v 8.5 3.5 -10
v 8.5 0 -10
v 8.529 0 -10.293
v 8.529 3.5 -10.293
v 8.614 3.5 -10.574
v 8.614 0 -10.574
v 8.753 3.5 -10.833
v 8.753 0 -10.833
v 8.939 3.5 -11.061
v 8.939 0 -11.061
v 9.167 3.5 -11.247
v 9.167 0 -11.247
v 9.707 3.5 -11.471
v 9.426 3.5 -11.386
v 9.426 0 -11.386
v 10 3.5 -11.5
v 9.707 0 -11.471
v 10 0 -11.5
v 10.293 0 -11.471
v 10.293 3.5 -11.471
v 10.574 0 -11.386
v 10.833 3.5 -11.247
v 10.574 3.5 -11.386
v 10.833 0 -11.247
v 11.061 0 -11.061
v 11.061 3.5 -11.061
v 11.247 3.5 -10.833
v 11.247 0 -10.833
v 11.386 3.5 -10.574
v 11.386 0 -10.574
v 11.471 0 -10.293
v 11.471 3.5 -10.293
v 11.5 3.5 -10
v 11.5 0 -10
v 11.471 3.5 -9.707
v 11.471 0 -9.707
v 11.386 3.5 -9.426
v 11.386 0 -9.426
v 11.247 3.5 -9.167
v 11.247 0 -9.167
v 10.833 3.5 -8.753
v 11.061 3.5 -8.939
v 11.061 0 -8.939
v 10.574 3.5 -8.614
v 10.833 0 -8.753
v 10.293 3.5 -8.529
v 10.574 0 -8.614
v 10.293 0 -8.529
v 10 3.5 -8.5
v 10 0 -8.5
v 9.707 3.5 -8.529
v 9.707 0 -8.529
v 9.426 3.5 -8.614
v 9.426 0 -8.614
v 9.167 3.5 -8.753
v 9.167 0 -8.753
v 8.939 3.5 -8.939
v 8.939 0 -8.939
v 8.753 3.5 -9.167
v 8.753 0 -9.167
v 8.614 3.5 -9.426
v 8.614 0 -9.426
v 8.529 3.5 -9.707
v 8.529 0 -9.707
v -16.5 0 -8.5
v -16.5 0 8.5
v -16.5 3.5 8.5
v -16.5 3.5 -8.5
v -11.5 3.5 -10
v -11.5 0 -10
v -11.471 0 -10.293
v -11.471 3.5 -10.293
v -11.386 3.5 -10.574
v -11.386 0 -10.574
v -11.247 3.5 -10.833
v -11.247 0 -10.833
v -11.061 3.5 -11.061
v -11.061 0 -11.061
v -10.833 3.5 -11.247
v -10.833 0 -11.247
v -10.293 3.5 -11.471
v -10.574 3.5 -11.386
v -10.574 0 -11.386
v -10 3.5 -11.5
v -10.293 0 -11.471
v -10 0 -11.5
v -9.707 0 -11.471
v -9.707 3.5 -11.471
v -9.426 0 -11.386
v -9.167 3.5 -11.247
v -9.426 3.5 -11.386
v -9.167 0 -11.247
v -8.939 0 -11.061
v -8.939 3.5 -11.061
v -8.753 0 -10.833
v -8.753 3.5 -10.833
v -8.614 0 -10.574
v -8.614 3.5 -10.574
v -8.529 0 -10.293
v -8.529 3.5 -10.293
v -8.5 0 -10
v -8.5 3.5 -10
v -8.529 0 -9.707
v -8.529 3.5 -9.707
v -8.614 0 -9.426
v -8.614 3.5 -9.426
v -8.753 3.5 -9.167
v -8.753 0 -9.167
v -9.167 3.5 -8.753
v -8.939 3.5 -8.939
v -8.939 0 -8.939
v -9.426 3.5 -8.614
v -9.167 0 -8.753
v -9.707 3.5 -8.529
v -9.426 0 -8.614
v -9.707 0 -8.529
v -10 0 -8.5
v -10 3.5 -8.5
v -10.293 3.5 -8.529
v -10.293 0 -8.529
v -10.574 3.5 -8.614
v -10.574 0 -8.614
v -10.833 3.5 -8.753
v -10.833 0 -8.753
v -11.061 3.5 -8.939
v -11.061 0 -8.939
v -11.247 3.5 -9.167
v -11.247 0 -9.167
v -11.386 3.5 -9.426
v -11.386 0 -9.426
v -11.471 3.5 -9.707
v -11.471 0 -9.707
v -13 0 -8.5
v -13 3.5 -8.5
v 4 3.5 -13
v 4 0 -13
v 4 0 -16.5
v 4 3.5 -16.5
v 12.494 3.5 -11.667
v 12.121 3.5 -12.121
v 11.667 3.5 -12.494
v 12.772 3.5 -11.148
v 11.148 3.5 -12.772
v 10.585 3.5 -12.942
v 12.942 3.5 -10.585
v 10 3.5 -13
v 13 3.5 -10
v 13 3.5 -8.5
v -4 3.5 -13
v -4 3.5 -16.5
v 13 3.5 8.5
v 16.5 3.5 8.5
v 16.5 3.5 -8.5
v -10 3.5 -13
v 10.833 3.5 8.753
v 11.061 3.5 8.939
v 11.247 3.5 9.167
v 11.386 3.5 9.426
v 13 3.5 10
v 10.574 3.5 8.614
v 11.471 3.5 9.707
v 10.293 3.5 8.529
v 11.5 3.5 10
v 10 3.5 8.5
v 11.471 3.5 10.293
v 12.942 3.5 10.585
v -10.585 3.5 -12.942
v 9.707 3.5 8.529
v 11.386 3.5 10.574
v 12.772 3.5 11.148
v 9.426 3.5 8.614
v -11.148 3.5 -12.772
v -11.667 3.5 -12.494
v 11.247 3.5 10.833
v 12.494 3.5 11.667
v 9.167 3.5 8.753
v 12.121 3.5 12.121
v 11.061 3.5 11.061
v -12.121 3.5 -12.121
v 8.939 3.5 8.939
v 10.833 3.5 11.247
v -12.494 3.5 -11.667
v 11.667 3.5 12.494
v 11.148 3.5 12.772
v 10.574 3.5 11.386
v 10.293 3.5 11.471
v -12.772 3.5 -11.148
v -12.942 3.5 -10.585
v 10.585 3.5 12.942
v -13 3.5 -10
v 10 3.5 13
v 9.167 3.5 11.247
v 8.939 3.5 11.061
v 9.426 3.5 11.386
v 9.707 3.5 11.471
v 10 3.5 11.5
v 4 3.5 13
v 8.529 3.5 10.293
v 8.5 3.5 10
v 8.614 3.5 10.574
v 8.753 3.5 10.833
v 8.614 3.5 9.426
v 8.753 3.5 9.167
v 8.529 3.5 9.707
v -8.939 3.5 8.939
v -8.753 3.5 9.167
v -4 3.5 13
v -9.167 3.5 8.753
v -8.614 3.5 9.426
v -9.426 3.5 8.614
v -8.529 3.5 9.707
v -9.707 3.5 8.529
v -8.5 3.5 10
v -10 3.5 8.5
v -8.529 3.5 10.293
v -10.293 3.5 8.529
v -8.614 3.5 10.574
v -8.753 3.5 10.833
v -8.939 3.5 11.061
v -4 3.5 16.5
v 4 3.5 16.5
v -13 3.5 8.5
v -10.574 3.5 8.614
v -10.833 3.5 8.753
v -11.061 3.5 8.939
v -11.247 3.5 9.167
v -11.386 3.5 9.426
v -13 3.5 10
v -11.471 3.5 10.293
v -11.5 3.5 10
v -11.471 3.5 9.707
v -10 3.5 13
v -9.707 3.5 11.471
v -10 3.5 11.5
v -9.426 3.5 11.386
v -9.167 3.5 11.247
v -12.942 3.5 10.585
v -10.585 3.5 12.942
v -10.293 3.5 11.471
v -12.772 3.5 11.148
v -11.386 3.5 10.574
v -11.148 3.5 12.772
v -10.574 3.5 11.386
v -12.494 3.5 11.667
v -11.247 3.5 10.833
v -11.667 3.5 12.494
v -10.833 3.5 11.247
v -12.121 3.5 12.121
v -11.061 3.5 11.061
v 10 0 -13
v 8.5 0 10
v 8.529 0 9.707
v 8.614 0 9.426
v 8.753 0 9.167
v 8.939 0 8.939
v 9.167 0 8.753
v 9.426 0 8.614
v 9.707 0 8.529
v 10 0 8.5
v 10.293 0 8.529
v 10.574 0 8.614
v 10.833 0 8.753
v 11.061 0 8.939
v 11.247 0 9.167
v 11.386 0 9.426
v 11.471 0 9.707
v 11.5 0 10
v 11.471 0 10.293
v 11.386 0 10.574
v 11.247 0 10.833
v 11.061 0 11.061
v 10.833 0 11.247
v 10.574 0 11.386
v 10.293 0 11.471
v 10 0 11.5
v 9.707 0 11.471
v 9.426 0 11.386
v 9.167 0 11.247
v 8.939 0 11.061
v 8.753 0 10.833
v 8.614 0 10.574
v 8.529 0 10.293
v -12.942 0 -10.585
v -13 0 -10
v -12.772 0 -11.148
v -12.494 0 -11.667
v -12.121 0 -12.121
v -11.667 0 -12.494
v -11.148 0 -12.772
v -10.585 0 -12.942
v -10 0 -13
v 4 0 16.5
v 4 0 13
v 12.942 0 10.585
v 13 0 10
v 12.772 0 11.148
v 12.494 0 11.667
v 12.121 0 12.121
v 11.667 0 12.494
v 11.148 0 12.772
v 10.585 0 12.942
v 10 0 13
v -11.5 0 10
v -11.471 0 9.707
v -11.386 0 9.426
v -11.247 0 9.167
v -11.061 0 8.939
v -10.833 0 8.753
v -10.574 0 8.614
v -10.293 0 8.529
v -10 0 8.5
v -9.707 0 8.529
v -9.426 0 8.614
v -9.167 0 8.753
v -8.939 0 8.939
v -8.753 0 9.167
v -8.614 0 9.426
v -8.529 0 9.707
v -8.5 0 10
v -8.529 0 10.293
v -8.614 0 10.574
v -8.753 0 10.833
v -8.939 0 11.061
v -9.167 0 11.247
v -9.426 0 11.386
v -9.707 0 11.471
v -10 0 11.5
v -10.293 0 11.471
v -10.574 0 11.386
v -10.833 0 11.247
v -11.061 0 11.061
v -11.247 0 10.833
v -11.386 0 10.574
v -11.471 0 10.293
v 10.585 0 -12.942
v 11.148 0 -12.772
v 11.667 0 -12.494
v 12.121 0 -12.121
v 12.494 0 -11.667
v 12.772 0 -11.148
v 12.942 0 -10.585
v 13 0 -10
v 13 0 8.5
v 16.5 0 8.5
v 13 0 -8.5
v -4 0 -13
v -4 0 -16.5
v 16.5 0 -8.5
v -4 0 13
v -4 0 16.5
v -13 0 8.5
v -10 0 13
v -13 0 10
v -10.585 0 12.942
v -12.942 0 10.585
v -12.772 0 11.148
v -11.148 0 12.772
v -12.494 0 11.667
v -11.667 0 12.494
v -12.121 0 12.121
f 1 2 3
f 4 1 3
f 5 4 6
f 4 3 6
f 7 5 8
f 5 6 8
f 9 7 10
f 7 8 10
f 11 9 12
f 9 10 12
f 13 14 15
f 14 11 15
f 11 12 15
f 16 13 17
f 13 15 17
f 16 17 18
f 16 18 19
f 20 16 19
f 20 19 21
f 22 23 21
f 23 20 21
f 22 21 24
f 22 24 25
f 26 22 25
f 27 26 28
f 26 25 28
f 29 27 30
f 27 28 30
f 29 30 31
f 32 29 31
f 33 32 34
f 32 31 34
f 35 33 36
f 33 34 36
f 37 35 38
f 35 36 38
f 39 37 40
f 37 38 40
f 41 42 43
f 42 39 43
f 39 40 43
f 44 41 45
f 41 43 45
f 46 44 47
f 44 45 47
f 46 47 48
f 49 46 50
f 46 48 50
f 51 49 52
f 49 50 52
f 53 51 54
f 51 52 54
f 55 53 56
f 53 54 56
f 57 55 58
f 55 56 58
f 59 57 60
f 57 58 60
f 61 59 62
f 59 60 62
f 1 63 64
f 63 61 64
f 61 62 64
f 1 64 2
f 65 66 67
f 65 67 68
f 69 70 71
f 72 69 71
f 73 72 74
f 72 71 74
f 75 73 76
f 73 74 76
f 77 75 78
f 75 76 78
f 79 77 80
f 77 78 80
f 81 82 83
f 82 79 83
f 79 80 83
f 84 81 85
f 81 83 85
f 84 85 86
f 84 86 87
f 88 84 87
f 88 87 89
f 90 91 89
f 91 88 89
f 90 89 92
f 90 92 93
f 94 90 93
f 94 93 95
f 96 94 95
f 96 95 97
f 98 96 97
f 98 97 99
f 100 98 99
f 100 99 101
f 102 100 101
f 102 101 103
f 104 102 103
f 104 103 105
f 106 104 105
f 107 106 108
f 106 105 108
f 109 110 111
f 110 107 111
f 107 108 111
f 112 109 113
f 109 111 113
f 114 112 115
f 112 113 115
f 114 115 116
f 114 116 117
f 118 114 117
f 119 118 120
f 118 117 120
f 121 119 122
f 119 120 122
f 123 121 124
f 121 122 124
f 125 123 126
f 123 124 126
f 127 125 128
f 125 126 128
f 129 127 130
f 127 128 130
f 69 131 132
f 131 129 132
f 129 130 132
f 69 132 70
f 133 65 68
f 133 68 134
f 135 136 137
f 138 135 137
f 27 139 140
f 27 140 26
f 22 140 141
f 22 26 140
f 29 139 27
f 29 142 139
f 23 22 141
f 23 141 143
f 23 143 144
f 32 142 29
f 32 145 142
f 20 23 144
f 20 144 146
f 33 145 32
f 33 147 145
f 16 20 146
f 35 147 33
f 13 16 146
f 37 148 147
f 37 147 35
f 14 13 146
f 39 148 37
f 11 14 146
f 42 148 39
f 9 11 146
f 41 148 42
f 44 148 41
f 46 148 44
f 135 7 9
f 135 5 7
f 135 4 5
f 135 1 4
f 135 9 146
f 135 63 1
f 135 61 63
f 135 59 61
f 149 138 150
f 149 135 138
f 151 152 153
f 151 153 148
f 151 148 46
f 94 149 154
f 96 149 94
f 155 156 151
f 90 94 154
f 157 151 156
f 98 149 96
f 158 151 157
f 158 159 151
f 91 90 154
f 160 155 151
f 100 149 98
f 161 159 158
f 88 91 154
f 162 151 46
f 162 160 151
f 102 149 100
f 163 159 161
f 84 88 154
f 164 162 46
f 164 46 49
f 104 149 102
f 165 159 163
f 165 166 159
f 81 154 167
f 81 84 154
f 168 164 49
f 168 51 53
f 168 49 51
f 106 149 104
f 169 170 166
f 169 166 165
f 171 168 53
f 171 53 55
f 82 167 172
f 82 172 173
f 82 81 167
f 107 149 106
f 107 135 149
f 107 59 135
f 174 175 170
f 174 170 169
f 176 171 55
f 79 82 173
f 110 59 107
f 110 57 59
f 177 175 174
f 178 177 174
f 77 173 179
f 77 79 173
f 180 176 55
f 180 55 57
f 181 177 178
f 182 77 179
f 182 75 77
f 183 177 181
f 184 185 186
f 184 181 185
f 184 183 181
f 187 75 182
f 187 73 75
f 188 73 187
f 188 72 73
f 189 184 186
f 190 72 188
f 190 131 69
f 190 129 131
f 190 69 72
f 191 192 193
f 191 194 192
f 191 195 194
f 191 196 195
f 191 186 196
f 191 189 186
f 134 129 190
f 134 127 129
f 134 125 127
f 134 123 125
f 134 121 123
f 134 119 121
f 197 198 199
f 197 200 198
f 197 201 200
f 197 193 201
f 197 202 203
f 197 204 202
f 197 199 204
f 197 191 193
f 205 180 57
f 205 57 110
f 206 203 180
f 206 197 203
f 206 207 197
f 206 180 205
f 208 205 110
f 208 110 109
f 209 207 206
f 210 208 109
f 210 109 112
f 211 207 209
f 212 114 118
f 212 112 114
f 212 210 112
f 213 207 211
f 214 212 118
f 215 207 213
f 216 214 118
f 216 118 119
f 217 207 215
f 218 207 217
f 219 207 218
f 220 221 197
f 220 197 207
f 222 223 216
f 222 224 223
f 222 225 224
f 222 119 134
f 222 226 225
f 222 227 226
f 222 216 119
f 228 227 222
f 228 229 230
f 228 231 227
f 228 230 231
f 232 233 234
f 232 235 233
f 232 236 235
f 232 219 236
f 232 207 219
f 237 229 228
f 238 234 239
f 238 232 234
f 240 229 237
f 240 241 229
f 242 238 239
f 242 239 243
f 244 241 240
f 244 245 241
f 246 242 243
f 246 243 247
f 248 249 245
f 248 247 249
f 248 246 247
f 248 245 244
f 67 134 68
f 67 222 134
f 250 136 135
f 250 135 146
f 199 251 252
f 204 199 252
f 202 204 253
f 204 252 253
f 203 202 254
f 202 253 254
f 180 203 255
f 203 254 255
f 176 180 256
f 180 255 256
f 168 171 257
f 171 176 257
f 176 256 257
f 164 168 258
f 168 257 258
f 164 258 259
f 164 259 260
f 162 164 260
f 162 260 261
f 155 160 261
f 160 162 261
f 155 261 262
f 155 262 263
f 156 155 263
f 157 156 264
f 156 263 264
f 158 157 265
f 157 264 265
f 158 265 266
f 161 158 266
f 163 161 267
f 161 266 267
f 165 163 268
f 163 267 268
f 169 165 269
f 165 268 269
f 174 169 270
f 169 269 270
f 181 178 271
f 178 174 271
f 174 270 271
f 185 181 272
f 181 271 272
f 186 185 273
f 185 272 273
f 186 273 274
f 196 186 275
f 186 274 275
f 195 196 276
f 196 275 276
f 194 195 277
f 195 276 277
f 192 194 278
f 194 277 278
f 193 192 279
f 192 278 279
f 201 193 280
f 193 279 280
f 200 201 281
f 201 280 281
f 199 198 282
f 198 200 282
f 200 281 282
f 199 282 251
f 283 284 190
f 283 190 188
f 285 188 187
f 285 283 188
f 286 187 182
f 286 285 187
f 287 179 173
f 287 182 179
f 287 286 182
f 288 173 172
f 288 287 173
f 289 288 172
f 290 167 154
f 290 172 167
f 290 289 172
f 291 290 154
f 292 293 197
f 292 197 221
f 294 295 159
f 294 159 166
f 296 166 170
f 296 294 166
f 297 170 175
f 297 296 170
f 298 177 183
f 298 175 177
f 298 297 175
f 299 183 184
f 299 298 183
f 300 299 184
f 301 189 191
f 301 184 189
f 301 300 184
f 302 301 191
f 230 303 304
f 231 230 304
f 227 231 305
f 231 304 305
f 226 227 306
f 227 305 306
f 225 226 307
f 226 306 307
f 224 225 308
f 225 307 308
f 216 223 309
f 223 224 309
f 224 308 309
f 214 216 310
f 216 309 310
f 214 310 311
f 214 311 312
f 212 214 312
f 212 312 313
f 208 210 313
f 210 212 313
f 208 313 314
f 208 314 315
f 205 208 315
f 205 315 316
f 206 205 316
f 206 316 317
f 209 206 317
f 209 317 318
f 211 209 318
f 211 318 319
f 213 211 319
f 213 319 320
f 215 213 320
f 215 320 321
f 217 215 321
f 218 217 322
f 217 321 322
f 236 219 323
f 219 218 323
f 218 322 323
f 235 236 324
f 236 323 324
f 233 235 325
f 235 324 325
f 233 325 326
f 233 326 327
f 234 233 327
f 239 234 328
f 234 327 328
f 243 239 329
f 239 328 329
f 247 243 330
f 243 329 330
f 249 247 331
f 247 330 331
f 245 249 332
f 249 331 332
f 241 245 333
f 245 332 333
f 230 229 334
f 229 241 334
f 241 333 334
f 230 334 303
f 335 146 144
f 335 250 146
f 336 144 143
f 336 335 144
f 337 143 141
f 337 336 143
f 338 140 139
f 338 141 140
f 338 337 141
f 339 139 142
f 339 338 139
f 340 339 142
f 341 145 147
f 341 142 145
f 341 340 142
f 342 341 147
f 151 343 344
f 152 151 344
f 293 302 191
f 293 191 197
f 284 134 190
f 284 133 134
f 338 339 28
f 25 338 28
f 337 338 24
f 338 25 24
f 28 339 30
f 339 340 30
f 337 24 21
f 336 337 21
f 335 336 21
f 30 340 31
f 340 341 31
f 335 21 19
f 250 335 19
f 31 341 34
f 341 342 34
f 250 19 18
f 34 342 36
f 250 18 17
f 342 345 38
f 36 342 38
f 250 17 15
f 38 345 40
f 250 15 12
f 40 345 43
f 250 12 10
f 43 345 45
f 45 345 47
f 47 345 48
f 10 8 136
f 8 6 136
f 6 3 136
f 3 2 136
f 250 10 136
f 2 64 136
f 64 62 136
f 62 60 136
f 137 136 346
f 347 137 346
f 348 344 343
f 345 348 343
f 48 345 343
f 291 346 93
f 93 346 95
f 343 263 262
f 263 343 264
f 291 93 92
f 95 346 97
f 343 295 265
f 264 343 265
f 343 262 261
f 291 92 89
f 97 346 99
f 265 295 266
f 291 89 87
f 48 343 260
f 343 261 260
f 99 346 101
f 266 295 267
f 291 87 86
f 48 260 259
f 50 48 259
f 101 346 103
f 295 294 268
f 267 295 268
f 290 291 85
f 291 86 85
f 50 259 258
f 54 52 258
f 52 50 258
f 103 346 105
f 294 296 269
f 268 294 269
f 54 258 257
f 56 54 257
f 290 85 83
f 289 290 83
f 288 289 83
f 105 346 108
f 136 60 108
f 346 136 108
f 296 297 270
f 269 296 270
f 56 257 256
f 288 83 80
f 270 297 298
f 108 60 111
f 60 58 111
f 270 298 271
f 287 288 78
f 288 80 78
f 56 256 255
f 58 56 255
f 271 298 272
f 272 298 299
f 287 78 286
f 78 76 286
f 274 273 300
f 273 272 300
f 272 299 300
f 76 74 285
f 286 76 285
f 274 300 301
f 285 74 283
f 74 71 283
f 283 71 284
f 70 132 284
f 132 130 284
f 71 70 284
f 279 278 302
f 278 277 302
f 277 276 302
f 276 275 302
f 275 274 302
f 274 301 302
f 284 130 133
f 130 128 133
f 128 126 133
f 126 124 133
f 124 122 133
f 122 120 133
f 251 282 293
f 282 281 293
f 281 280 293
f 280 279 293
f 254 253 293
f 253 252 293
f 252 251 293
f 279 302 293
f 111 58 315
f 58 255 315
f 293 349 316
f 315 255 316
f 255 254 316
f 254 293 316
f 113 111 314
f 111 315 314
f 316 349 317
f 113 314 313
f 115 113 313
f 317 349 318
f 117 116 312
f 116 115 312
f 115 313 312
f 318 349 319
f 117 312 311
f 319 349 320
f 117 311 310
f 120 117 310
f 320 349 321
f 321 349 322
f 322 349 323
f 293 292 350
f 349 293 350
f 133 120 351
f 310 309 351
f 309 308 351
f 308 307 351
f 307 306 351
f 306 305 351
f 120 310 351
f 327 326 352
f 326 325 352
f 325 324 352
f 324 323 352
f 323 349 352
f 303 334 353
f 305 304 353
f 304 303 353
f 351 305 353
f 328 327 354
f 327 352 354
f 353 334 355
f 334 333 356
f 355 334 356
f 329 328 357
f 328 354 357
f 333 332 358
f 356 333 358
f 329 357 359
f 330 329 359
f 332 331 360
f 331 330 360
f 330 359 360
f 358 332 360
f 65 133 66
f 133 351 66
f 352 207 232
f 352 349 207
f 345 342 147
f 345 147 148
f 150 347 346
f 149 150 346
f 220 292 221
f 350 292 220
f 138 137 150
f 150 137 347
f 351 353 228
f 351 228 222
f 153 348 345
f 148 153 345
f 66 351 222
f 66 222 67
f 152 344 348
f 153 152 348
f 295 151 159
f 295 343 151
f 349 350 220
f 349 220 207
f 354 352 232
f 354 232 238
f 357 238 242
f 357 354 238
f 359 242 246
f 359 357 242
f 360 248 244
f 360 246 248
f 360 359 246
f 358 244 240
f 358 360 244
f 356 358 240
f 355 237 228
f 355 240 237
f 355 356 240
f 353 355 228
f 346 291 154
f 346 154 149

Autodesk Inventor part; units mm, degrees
ref_plane "YZ Plane" through (0, 0, 0) normal (1, 0, 0) x (0, 1, 0)
ref_plane "XZ Plane" through (0, 0, 0) normal (0, 1, 0) x (-1, 0, 0)
ref_plane "XY Plane" through (0, 0, 0) normal (0, 0, 1) x (1, 0, 0)
sketch "Sketch2" plane through (0, 0, 0) normal (0, 1, 0) x (-1, 0, 0)
  line L0 (10, -13) -> (-10, -13)
  line L1 (-13, -10) -> (-13, 10)
  line L2 (-10, 13) -> (10, 13)
  line L3 (13, 10) -> (13, -10)
  line L4 (13, -13) -> (-13, 13) construction
  line L5 (-13, -13) -> (13, 13) construction
  circle A0 centre (10, 10) radius 1.5
  circle A1 centre (-10, 10) radius 1.5
  circle A2 centre (-10, -10) radius 1.5
  circle A3 centre (10, -10) radius 1.5
  arc A4 (13, 10) -> (10, 13) centre (10, 10) ccw
  arc A5 (-10, 13) -> (-13, 10) centre (-10, 10) ccw
  arc A6 (-13, -10) -> (-10, -13) centre (-10, -10) ccw
  arc A7 (10, -13) -> (13, -10) centre (10, -10) ccw
  line L6 (13, 8.5) -> (16.5, 8.5)
  line L7 (16.5, 8.5) -> (16.5, -8.5)
  line L8 (16.5, -8.5) -> (13, -8.5)
  line L9 (13, -8.5) -> (13, 8.5)
  line L10 (0, 0) -> (6.0959, 0)
  line L11 (0, 0) -> (0, 5.3302)
  line L12 (-13, 8.5) -> (-16.5, 8.5)
  line L13 (-16.5, 8.5) -> (-16.5, -8.5)
  line L14 (-16.5, -8.5) -> (-13, -8.5)
  line L15 (-13, -8.5) -> (-13, 8.5)
  line L16 (4, 13) -> (-4, 13)
  line L17 (-4, 13) -> (-4, 16.5)
  line L18 (-4, 16.5) -> (4, 16.5)
  line L19 (4, 16.5) -> (4, 13)
  line L20 (4, -13) -> (-4, -13)
  line L21 (-4, -13) -> (-4, -16.5)
  line L22 (-4, -16.5) -> (4, -16.5)
  line L23 (4, -16.5) -> (4, -13)
  dimension "d10" = 26
  dimension "d11" = 26
  dimension "d12" = 3
  dimension "d13" = 3
  dimension "d14" = 3
  dimension "d15" = 3
  dimension "d16" = 20
  dimension "d17" = 3
  dimension "d18" = 3.5
  dimension "d19" = 17
  dimension "d20" = 8
  dimension "d21" = 3.5
extrude "Extrusion2" add sketch "Sketch2" along normal blind 3.5
properties part number "HGLRC Micro 13A 4in1 BLHeli_S"
